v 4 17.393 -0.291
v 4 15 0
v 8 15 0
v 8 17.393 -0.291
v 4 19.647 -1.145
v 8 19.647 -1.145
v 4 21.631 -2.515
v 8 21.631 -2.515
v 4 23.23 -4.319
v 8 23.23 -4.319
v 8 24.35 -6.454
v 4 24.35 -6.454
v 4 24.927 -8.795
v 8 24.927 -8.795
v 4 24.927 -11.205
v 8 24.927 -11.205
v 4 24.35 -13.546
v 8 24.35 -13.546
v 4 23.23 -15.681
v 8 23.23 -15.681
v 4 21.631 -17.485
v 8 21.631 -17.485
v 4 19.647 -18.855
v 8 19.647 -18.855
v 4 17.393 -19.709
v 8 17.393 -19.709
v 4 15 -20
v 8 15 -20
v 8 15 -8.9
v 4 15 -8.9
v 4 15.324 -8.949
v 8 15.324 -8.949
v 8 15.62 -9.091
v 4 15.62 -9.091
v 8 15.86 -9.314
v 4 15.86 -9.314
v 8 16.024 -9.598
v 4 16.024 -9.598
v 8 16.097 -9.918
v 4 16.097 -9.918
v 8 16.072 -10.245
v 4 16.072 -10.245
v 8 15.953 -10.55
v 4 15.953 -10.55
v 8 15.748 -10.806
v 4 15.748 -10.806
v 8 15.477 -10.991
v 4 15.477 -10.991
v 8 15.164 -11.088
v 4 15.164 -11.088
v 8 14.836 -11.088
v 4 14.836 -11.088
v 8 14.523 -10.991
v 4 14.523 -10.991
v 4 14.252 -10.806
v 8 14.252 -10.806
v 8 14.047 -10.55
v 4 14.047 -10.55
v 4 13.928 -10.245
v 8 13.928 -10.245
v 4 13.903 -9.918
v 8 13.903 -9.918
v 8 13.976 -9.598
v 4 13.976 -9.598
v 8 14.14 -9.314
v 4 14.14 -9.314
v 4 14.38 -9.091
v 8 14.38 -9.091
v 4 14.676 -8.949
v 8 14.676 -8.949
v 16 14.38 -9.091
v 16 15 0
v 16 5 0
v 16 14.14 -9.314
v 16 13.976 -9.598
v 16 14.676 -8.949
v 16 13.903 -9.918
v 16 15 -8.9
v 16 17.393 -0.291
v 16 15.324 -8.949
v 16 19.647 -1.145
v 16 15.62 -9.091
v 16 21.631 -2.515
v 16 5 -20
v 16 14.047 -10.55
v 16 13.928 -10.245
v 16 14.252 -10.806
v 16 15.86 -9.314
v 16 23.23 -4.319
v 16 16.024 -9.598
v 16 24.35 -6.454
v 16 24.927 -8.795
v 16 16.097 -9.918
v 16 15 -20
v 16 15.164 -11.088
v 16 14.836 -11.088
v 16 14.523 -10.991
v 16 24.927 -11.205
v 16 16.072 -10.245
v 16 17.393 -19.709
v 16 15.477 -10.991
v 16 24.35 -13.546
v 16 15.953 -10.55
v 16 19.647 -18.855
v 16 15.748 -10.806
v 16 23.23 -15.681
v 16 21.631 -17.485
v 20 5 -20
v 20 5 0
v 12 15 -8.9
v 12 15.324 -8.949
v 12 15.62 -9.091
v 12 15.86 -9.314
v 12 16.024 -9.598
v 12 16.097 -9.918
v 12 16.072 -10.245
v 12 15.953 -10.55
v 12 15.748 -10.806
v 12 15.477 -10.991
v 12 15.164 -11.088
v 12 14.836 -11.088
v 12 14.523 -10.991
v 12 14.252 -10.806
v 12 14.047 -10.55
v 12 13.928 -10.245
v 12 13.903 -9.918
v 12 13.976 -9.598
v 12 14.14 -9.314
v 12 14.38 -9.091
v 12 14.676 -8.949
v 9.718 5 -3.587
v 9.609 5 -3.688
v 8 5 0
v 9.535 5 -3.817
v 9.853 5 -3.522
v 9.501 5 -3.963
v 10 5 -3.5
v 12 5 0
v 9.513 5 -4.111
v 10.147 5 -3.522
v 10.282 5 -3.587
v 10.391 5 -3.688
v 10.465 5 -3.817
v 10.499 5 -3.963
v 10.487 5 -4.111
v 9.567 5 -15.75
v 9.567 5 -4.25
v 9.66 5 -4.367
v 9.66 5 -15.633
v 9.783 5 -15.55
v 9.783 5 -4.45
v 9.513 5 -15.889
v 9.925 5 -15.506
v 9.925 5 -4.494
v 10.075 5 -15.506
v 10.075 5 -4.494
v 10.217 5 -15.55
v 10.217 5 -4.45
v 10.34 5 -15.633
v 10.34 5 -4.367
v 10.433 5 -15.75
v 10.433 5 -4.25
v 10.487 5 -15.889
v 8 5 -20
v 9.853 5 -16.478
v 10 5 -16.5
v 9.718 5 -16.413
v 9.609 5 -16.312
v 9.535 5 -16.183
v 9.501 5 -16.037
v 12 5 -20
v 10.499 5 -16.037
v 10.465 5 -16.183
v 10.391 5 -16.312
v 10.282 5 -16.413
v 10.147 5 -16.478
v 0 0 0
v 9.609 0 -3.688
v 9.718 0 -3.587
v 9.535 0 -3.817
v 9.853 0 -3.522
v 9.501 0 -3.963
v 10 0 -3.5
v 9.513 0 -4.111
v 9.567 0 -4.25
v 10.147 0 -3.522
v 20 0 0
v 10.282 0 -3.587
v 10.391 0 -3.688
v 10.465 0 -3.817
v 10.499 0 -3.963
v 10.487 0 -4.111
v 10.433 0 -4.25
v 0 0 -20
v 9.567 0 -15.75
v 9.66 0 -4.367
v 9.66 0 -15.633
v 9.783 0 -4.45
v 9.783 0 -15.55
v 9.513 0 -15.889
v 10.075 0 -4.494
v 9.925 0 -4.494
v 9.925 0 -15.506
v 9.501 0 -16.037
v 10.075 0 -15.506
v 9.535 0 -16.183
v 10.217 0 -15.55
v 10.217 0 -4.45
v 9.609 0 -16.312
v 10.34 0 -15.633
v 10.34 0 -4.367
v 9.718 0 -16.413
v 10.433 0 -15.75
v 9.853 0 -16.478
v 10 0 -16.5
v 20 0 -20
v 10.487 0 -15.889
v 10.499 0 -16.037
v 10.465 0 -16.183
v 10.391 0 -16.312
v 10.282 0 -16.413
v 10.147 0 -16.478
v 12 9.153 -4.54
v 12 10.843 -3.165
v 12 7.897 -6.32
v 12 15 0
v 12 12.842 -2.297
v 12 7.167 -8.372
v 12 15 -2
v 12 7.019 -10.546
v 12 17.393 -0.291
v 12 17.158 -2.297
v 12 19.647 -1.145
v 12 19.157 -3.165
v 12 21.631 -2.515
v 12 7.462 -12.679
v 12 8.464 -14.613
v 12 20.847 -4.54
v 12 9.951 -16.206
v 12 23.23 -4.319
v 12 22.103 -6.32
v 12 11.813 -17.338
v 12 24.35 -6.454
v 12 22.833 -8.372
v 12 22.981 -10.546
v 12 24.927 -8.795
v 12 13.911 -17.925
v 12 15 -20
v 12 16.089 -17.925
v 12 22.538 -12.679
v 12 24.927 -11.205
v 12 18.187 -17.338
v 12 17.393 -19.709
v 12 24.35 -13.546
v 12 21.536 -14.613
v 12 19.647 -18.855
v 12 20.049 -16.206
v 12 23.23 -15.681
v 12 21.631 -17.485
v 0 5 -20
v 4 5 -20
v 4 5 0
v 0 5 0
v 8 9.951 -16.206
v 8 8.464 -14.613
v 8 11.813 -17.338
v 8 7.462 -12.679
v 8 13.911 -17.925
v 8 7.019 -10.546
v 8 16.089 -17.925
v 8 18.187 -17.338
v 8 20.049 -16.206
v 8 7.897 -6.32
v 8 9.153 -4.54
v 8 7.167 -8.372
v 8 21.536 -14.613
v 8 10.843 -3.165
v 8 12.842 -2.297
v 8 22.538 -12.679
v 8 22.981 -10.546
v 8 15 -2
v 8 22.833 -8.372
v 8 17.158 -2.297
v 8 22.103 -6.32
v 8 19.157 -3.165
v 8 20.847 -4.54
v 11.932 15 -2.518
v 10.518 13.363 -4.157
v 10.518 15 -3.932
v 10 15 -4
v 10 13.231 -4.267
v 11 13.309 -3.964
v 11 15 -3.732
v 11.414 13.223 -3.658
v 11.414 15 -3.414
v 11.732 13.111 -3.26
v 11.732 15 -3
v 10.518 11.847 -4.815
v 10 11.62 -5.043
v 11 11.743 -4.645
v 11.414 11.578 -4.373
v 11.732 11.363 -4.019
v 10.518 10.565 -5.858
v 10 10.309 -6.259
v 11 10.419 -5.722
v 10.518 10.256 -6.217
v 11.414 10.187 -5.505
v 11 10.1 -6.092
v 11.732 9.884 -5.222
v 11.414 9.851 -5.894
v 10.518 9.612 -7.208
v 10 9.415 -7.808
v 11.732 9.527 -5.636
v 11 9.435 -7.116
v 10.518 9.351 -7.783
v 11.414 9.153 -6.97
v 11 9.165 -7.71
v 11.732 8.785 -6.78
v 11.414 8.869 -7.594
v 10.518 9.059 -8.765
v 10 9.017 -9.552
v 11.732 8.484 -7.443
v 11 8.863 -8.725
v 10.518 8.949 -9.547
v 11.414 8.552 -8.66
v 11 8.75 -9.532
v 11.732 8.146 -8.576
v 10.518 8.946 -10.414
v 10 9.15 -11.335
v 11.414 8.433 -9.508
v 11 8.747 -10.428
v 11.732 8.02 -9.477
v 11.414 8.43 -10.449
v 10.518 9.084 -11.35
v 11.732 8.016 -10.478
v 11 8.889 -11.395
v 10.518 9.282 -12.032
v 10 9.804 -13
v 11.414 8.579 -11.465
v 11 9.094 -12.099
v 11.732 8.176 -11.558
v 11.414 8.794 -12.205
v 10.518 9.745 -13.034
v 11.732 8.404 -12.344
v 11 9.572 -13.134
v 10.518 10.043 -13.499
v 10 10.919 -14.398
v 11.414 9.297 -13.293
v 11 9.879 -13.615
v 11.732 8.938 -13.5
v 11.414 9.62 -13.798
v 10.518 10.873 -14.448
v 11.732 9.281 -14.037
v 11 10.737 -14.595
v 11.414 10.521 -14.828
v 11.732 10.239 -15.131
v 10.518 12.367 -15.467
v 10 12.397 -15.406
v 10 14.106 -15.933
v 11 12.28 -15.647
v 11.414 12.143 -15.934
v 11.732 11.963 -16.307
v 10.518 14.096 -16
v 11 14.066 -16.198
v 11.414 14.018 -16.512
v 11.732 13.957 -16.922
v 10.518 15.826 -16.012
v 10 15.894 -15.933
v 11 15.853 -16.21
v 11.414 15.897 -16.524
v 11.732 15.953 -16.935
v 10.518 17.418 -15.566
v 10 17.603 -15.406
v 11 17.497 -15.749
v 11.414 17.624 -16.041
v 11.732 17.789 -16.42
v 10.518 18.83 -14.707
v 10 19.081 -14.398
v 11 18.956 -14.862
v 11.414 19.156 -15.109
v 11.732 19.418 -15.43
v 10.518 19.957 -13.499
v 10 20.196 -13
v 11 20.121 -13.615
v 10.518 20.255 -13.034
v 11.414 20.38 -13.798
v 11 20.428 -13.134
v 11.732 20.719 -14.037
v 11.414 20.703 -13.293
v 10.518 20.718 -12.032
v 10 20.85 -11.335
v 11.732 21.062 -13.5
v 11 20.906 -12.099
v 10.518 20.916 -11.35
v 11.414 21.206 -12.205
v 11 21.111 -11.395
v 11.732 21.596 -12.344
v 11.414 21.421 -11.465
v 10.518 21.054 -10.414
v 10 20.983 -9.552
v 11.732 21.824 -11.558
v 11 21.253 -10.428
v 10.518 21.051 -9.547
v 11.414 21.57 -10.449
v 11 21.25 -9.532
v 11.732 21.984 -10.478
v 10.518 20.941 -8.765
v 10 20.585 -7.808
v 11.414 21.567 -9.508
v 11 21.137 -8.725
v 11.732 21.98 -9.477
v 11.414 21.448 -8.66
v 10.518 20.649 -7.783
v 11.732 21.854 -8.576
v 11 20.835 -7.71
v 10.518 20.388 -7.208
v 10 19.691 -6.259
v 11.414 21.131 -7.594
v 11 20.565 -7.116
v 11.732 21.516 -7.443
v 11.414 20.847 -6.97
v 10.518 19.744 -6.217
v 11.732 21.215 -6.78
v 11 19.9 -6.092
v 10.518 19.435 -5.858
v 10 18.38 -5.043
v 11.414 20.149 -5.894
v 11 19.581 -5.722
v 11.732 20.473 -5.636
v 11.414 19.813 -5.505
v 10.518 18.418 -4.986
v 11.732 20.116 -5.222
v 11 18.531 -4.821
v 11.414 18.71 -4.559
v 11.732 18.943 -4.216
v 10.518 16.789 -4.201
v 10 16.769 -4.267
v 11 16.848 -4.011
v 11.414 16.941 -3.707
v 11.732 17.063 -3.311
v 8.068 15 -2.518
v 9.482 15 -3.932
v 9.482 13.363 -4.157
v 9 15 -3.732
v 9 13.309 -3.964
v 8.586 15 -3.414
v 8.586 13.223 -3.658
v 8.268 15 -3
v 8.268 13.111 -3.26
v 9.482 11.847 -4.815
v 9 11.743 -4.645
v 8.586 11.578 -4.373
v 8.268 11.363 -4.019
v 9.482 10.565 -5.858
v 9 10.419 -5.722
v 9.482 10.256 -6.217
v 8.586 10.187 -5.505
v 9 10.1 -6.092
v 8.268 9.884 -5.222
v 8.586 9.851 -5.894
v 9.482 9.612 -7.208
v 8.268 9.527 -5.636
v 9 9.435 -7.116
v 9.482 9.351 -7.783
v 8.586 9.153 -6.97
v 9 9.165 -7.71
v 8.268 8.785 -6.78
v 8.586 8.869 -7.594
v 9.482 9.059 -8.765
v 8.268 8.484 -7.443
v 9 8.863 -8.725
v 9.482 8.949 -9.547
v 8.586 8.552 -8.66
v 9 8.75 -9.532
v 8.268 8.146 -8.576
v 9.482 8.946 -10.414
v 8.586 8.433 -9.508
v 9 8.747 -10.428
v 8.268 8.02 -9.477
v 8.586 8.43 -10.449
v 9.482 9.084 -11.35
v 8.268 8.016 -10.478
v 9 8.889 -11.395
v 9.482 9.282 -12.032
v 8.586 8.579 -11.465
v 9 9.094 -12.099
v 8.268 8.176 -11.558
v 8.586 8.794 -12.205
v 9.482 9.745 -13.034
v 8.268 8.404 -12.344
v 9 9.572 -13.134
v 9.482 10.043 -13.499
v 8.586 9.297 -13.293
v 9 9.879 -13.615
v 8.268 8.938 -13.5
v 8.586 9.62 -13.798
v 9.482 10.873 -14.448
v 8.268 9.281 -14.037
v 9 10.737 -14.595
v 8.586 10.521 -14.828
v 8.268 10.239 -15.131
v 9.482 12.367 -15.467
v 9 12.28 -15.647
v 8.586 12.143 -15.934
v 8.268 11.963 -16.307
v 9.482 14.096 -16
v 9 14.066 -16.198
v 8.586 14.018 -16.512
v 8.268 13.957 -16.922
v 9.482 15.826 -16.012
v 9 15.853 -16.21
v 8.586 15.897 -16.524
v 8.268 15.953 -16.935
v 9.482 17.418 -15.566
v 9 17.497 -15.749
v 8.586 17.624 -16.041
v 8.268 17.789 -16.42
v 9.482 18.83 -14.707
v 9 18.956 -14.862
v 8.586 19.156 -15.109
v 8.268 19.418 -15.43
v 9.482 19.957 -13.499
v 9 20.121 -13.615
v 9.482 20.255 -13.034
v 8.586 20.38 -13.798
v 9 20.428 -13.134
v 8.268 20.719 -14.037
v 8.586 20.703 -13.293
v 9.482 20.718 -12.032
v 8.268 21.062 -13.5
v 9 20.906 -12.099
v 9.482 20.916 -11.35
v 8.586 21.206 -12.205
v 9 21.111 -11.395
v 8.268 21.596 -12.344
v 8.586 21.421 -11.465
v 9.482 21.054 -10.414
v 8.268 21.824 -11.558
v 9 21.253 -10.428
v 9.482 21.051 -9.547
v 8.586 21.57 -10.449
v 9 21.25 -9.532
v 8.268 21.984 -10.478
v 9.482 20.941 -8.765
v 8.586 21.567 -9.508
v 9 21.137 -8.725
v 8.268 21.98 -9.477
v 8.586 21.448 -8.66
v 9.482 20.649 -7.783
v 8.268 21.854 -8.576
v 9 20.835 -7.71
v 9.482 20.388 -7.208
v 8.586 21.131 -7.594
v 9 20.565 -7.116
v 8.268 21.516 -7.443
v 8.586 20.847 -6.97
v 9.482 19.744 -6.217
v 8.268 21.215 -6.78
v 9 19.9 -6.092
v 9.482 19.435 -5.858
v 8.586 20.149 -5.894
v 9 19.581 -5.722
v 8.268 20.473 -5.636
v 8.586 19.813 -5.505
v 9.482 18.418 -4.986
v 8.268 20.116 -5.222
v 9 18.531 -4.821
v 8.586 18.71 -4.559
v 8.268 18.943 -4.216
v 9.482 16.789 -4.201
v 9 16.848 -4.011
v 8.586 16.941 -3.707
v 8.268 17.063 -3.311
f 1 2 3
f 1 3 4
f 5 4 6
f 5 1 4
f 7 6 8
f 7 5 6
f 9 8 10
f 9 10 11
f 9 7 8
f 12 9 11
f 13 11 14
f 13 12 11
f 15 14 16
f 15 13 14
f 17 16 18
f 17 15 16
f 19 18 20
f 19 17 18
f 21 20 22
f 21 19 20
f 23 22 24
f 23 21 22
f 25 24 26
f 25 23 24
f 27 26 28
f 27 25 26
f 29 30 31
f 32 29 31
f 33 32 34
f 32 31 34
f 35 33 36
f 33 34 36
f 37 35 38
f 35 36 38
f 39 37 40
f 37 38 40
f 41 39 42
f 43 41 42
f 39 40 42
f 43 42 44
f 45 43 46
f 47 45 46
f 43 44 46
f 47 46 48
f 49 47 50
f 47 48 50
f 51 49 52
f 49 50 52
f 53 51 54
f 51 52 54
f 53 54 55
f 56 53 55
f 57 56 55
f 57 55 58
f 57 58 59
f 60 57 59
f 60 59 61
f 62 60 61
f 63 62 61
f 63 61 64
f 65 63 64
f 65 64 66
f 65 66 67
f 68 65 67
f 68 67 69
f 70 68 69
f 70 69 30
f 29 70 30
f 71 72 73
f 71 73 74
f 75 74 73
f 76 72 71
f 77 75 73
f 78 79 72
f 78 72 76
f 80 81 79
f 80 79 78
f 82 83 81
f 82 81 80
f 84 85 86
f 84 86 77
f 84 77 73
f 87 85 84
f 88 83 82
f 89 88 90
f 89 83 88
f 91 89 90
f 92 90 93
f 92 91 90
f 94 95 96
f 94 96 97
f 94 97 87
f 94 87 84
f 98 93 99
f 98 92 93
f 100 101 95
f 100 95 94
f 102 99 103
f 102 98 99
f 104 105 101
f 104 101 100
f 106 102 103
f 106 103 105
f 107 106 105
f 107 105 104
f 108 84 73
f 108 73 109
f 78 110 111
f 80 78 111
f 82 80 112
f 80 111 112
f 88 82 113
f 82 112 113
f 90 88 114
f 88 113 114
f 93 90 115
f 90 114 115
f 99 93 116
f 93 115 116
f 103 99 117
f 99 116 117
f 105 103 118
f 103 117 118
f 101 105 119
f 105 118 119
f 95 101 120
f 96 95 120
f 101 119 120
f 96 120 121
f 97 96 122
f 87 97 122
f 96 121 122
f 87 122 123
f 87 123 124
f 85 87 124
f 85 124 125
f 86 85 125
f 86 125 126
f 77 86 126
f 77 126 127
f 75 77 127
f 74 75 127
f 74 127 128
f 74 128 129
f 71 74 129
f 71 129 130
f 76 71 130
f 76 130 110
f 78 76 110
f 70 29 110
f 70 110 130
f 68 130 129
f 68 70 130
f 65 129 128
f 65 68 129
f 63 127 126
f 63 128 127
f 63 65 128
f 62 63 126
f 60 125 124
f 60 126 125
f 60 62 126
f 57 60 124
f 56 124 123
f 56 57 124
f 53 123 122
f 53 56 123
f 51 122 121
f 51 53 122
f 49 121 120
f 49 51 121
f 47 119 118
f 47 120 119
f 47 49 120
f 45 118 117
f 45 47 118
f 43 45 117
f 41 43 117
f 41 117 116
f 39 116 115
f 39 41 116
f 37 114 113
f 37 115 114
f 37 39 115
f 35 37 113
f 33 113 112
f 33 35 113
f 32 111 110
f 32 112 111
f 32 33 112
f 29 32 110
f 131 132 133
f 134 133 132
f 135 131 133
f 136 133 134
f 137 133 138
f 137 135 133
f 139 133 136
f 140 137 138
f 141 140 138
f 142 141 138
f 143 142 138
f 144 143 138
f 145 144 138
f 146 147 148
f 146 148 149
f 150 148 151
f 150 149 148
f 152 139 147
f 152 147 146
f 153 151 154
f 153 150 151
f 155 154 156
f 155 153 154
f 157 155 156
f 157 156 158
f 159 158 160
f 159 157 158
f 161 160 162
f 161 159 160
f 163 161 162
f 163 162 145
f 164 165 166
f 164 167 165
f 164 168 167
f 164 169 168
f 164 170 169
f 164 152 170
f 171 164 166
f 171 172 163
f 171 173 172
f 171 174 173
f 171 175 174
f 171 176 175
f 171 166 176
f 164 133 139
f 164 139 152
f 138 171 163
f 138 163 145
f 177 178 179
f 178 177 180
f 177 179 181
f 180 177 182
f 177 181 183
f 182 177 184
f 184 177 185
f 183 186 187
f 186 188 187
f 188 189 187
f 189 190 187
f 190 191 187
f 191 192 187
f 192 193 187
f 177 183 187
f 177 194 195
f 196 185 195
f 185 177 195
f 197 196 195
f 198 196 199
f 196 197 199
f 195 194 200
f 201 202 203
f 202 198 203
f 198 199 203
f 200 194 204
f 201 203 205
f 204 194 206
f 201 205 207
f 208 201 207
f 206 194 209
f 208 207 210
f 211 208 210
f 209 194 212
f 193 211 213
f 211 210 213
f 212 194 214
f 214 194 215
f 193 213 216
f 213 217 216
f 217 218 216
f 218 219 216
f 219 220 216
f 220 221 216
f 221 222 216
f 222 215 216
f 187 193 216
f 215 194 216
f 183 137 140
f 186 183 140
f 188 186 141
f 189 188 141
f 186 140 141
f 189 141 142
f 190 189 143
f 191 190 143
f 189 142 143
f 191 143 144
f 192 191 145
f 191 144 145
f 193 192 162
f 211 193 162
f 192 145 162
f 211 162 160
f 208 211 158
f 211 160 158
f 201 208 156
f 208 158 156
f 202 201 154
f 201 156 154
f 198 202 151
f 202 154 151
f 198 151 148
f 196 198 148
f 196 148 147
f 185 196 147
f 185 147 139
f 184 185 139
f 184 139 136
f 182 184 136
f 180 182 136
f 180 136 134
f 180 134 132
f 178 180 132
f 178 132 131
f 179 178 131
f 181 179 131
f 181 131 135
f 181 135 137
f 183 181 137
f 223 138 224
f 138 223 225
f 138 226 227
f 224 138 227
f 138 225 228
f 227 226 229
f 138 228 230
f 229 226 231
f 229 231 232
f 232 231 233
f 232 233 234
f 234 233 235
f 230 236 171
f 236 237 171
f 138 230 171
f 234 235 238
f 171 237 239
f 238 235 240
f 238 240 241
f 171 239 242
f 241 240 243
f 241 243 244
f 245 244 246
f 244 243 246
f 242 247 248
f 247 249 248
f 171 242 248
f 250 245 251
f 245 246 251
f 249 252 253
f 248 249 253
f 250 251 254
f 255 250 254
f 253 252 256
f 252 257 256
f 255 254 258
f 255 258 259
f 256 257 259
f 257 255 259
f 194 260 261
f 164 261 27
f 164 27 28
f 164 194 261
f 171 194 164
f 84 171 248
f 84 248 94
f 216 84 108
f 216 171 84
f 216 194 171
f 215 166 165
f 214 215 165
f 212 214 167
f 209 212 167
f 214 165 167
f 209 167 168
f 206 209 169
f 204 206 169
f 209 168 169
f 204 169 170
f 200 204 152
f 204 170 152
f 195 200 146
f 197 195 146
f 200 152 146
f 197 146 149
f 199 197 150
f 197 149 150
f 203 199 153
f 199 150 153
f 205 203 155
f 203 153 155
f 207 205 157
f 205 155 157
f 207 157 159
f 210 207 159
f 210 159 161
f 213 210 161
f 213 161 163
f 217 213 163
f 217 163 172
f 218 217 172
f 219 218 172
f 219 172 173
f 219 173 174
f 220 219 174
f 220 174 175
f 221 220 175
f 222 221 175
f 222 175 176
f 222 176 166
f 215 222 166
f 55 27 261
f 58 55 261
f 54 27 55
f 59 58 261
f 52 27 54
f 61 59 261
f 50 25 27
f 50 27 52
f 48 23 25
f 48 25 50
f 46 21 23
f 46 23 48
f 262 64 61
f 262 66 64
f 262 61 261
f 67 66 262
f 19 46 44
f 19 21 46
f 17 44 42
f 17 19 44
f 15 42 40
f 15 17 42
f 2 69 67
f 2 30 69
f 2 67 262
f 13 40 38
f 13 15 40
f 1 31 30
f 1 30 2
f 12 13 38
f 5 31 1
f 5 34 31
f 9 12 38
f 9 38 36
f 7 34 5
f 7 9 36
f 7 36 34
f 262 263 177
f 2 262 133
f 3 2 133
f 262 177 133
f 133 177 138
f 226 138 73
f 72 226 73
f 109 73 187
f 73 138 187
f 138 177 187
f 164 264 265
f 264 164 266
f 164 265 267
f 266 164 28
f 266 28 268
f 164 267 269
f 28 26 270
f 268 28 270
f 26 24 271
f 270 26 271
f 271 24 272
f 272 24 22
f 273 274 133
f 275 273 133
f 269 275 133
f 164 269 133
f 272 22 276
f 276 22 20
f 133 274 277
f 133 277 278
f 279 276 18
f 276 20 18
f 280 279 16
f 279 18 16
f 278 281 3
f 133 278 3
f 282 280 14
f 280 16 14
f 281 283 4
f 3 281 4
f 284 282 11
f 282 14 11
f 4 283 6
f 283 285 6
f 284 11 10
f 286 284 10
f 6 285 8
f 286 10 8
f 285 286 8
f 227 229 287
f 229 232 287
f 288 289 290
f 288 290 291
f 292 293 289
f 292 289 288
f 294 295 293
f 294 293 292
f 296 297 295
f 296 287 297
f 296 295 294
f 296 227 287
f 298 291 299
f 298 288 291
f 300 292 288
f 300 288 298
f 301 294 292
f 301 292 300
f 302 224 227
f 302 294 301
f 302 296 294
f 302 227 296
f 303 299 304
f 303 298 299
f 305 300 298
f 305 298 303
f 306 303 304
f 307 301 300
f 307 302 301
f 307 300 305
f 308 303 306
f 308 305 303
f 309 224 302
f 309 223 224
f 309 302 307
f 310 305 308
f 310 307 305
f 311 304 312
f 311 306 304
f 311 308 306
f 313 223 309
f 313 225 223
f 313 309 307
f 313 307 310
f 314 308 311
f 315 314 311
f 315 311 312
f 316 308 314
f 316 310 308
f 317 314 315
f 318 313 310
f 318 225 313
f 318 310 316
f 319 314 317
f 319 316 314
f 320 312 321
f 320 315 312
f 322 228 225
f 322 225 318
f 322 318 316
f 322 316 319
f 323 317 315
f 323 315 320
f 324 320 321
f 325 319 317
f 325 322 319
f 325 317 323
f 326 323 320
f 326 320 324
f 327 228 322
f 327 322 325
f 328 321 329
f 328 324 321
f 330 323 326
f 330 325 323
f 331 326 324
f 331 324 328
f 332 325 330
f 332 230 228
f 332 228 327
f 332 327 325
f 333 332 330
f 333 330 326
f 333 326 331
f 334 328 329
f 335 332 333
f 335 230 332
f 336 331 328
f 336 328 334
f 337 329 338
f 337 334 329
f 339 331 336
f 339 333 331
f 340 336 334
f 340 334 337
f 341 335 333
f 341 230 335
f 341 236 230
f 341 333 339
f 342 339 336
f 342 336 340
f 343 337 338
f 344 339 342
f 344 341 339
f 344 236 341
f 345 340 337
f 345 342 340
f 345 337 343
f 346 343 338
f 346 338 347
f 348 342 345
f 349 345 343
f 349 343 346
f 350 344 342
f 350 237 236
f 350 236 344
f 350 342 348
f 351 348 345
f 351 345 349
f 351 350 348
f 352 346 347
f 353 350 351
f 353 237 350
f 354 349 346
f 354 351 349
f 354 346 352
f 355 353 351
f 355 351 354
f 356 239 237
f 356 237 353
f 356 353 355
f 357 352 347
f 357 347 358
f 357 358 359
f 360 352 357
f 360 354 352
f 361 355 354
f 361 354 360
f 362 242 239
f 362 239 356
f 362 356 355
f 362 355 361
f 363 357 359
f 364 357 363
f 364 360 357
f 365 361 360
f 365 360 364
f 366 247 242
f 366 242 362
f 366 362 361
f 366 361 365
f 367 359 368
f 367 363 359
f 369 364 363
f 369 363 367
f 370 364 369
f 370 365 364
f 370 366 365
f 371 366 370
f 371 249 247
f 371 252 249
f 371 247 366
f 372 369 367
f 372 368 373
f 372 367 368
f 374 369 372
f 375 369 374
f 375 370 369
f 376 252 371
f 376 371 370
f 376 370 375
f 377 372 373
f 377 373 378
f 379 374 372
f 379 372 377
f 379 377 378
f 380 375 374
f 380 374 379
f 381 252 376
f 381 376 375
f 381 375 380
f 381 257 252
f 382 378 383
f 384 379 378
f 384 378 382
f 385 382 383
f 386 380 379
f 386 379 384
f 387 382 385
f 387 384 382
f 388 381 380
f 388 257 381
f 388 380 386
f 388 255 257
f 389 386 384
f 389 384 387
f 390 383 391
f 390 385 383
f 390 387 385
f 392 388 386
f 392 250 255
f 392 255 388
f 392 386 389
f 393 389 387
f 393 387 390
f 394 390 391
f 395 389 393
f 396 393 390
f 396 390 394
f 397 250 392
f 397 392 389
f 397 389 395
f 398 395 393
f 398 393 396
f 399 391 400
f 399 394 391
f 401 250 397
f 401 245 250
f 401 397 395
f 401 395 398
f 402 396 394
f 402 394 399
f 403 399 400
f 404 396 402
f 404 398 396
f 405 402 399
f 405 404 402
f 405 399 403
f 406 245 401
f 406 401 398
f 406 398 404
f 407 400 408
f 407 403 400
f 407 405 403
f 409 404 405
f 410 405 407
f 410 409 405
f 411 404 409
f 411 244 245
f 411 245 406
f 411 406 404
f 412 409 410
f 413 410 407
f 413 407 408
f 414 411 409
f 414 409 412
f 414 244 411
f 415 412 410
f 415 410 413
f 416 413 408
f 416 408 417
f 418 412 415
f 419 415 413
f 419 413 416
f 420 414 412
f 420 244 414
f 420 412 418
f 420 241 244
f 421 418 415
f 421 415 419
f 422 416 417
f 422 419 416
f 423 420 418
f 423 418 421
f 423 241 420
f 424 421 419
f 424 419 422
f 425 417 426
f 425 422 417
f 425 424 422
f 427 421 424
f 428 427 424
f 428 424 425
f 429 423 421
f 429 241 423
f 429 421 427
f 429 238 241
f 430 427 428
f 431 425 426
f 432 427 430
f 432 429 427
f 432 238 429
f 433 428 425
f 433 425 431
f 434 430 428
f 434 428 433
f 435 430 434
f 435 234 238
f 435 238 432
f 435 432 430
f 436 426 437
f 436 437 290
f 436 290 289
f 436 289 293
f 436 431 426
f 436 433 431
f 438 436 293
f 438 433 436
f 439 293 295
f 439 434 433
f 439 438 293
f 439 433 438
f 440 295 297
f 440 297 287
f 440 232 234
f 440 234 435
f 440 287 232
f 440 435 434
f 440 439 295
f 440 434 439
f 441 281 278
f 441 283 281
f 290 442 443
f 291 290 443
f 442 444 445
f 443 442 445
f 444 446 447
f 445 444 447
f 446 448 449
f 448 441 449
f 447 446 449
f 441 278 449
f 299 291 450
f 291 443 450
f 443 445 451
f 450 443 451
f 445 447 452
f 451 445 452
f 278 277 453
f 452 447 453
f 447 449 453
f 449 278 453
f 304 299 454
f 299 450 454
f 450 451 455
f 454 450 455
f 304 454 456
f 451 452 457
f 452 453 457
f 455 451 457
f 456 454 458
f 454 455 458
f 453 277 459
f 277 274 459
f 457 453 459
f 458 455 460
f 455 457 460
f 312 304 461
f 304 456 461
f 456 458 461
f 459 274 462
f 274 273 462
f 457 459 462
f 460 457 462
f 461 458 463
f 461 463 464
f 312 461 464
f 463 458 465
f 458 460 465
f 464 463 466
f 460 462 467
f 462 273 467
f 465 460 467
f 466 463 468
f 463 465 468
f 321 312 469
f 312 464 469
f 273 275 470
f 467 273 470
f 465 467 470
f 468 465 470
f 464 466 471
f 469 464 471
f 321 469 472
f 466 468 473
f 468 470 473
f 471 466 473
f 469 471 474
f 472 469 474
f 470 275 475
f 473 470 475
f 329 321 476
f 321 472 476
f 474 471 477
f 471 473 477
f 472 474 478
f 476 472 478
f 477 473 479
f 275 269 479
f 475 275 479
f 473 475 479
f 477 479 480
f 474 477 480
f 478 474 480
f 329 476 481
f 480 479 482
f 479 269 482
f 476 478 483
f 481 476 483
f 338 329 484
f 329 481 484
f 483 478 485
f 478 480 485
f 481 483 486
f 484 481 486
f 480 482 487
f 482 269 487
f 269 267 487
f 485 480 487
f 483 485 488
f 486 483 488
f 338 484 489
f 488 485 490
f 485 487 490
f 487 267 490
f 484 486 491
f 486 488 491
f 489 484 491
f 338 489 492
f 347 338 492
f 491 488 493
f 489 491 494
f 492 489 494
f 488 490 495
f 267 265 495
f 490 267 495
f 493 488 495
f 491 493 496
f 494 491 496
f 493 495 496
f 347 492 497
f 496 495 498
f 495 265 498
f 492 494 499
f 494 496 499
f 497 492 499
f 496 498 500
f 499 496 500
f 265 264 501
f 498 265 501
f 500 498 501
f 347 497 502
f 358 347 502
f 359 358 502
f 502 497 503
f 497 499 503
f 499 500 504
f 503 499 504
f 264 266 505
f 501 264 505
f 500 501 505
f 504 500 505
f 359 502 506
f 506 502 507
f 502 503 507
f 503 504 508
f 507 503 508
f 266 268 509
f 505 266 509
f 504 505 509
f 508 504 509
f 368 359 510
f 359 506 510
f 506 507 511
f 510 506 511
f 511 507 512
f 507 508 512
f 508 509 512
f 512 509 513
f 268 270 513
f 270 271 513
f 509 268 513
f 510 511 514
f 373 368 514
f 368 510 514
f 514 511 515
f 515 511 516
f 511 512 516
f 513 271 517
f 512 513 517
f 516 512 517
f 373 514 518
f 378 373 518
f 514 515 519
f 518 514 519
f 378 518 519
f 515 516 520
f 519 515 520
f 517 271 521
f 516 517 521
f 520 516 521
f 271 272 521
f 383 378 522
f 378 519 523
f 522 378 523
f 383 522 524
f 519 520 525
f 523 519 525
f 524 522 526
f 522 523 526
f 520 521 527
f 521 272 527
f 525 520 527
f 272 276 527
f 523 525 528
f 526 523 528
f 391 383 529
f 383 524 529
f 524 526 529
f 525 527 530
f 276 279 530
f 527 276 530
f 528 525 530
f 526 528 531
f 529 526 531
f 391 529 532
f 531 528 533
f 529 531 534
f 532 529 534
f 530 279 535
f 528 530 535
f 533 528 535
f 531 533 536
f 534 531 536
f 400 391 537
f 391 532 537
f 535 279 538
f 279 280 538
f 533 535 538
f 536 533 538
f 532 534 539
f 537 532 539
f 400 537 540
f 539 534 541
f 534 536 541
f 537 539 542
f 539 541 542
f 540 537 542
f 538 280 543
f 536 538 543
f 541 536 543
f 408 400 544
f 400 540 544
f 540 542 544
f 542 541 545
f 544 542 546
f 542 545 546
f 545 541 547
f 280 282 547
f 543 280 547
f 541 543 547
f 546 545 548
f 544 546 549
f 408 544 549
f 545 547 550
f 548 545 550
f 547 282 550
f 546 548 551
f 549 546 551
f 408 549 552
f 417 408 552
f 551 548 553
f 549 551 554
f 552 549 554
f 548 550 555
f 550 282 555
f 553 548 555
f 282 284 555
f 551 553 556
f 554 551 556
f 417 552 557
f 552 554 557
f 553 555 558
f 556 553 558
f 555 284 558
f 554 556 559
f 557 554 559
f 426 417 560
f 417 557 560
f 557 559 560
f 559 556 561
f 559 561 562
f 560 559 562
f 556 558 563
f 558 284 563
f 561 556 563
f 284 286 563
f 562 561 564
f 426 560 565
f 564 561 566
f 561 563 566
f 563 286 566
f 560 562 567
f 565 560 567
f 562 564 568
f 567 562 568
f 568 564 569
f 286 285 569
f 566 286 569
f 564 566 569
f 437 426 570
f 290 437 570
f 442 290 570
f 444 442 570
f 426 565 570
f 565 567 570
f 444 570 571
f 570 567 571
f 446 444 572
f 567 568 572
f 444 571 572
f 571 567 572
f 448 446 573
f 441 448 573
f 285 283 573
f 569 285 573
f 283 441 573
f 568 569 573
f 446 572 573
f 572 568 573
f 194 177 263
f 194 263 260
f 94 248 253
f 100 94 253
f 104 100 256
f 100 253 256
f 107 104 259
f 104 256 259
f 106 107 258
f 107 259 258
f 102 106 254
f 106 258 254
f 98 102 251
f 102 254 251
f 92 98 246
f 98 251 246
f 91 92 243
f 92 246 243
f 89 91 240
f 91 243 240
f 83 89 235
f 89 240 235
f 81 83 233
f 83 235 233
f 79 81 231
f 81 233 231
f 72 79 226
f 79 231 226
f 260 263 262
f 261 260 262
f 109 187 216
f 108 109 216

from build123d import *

# Parameters (mm, degrees)
SKETCH1_W           = 20
SKETCH1_H           = 20
BOSS_EXTRUDE1_DEPTH = 5
SKETCH3_W           = 4
SKETCH3_H           = 20
BOSS_EXTRUDE2_DEPTH = 10
SKETCH4_R           = 10
BOSS_EXTRUDE3_DEPTH = 4
BOSS_EXTRUDE4_START = -4
SKETCH5_R           = 10
BOSS_EXTRUDE4_DEPTH = 4
SKETCH6_R           = 1.1
CUT_EXTRUDE1_DEPTH  = 36.791060336
SKETCH7_R           = 0.5
CUT_EXTRUDE2_DEPTH  = 35.641016151
SKETCH9_R           = 6
BOSS_EXTRUDE5_DEPTH = 4
SKETCH10_R          = 1.1
CUT_EXTRUDE3_DEPTH  = 4
FILLET1_R           = 2


with BuildPart() as part:
    # Sketch1 → Boss-Extrude1 (new body)
    with BuildSketch(Plane(origin=(0, 0, 0), x_dir=(1, 0, 0), z_dir=(0, 1, 0))):
        with Locations((10, 10)):
            Rectangle(SKETCH1_W, SKETCH1_H)
    extrude(amount=BOSS_EXTRUDE1_DEPTH)

    # Sketch3 → Boss-Extrude2 (add)
    with BuildSketch(Plane(origin=(0, 5, 0), x_dir=(1, 0, 0), z_dir=(0, 1, 0))):
        with Locations((6, 10)):
            Rectangle(SKETCH3_W, SKETCH3_H)
        with Locations((14, 10)):
            Rectangle(SKETCH3_W, SKETCH3_H)
    extrude(amount=BOSS_EXTRUDE2_DEPTH)

    # Sketch4 → Boss-Extrude3 (add)
    with BuildSketch(Plane.ZY.offset(-4)):
        with Locations((-10, 15)):
            Circle(SKETCH4_R)
    extrude(amount=-BOSS_EXTRUDE3_DEPTH)

    # Sketch5 → Boss-Extrude4 (add)
    with BuildSketch(Plane(origin=(16, 0, 0), x_dir=(0, 0, -1), z_dir=(1, 0, 0)).offset(BOSS_EXTRUDE4_START)):
        with Locations((10, 15)):
            Circle(SKETCH5_R)
    extrude(amount=BOSS_EXTRUDE4_DEPTH)

    # Sketch6 → Cut-Extrude1 (cut, through all)
    with BuildSketch(Plane.ZY.offset(-4)):
        with Locations((-10, 15)):
            Circle(SKETCH6_R)
    extrude(amount=-CUT_EXTRUDE1_DEPTH, mode=Mode.SUBTRACT)

    # Sketch7 → Cut-Extrude2 (cut, through all)
    with BuildSketch(Plane(origin=(0, 5, 0), x_dir=(1, 0, 0), z_dir=(0, 1, 0))):
        with Locations(Location((10, 4, 0), (0, 0, 270))):
            Circle(SKETCH7_R)
        with Locations(Location((10, 16, 0), (0, 0, 90))):
            Circle(SKETCH7_R)
    extrude(amount=-CUT_EXTRUDE2_DEPTH, mode=Mode.SUBTRACT)

    # Sketch9 → Boss-Extrude5 (add)
    with BuildSketch(Plane(origin=(8, 0, 0), x_dir=(0, 0, -1), z_dir=(1, 0, 0))):
        with Locations(Location((10, 15, 0), (0, 0, 180))):
            Circle(SKETCH9_R)
    extrude(amount=BOSS_EXTRUDE5_DEPTH)

    # Sketch10 → Cut-Extrude3 (cut)
    with BuildSketch(Plane(origin=(8, 0, 0), x_dir=(0, 0, -1), z_dir=(1, 0, 0))):
        with Locations(Location((10, 15, 0), (0, 0, 180))):
            Circle(SKETCH10_R)
    extrude(amount=CUT_EXTRUDE3_DEPTH, mode=Mode.SUBTRACT)

    # Fillet1
    fillet1_edges = [part.edges().sort_by_distance(p)[0] for p in [
        (12, 15, -16),
        (8, 15, -16),
    ]]
    fillet(fillet1_edges, radius=FILLET1_R - 0.0001)  # a hair under: the kernel refuses the full size


solid = part.part
